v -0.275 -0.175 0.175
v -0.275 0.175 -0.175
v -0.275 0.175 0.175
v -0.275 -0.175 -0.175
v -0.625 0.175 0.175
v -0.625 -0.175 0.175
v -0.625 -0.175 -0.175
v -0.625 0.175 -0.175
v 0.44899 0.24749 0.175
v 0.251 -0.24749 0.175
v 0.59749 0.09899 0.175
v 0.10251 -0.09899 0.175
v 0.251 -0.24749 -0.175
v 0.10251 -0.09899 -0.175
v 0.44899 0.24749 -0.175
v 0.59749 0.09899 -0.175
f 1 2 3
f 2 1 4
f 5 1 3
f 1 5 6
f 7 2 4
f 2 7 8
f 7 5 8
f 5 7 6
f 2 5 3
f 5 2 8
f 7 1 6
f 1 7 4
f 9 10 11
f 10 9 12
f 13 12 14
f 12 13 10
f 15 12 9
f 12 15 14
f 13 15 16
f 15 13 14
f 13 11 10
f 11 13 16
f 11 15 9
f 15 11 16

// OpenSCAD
// Native subset transform fixture.
union() {
  translate([-0.45, 0.0, 0.0])
    cube([0.35, 0.35, 0.35], center = true);
  translate([0.35, 0.0, 0.0])
    rotate([0, 0, 45])
      scale([1.4, 0.6, 1.0])
        cube([0.35, 0.35, 0.35], center = true);
}
